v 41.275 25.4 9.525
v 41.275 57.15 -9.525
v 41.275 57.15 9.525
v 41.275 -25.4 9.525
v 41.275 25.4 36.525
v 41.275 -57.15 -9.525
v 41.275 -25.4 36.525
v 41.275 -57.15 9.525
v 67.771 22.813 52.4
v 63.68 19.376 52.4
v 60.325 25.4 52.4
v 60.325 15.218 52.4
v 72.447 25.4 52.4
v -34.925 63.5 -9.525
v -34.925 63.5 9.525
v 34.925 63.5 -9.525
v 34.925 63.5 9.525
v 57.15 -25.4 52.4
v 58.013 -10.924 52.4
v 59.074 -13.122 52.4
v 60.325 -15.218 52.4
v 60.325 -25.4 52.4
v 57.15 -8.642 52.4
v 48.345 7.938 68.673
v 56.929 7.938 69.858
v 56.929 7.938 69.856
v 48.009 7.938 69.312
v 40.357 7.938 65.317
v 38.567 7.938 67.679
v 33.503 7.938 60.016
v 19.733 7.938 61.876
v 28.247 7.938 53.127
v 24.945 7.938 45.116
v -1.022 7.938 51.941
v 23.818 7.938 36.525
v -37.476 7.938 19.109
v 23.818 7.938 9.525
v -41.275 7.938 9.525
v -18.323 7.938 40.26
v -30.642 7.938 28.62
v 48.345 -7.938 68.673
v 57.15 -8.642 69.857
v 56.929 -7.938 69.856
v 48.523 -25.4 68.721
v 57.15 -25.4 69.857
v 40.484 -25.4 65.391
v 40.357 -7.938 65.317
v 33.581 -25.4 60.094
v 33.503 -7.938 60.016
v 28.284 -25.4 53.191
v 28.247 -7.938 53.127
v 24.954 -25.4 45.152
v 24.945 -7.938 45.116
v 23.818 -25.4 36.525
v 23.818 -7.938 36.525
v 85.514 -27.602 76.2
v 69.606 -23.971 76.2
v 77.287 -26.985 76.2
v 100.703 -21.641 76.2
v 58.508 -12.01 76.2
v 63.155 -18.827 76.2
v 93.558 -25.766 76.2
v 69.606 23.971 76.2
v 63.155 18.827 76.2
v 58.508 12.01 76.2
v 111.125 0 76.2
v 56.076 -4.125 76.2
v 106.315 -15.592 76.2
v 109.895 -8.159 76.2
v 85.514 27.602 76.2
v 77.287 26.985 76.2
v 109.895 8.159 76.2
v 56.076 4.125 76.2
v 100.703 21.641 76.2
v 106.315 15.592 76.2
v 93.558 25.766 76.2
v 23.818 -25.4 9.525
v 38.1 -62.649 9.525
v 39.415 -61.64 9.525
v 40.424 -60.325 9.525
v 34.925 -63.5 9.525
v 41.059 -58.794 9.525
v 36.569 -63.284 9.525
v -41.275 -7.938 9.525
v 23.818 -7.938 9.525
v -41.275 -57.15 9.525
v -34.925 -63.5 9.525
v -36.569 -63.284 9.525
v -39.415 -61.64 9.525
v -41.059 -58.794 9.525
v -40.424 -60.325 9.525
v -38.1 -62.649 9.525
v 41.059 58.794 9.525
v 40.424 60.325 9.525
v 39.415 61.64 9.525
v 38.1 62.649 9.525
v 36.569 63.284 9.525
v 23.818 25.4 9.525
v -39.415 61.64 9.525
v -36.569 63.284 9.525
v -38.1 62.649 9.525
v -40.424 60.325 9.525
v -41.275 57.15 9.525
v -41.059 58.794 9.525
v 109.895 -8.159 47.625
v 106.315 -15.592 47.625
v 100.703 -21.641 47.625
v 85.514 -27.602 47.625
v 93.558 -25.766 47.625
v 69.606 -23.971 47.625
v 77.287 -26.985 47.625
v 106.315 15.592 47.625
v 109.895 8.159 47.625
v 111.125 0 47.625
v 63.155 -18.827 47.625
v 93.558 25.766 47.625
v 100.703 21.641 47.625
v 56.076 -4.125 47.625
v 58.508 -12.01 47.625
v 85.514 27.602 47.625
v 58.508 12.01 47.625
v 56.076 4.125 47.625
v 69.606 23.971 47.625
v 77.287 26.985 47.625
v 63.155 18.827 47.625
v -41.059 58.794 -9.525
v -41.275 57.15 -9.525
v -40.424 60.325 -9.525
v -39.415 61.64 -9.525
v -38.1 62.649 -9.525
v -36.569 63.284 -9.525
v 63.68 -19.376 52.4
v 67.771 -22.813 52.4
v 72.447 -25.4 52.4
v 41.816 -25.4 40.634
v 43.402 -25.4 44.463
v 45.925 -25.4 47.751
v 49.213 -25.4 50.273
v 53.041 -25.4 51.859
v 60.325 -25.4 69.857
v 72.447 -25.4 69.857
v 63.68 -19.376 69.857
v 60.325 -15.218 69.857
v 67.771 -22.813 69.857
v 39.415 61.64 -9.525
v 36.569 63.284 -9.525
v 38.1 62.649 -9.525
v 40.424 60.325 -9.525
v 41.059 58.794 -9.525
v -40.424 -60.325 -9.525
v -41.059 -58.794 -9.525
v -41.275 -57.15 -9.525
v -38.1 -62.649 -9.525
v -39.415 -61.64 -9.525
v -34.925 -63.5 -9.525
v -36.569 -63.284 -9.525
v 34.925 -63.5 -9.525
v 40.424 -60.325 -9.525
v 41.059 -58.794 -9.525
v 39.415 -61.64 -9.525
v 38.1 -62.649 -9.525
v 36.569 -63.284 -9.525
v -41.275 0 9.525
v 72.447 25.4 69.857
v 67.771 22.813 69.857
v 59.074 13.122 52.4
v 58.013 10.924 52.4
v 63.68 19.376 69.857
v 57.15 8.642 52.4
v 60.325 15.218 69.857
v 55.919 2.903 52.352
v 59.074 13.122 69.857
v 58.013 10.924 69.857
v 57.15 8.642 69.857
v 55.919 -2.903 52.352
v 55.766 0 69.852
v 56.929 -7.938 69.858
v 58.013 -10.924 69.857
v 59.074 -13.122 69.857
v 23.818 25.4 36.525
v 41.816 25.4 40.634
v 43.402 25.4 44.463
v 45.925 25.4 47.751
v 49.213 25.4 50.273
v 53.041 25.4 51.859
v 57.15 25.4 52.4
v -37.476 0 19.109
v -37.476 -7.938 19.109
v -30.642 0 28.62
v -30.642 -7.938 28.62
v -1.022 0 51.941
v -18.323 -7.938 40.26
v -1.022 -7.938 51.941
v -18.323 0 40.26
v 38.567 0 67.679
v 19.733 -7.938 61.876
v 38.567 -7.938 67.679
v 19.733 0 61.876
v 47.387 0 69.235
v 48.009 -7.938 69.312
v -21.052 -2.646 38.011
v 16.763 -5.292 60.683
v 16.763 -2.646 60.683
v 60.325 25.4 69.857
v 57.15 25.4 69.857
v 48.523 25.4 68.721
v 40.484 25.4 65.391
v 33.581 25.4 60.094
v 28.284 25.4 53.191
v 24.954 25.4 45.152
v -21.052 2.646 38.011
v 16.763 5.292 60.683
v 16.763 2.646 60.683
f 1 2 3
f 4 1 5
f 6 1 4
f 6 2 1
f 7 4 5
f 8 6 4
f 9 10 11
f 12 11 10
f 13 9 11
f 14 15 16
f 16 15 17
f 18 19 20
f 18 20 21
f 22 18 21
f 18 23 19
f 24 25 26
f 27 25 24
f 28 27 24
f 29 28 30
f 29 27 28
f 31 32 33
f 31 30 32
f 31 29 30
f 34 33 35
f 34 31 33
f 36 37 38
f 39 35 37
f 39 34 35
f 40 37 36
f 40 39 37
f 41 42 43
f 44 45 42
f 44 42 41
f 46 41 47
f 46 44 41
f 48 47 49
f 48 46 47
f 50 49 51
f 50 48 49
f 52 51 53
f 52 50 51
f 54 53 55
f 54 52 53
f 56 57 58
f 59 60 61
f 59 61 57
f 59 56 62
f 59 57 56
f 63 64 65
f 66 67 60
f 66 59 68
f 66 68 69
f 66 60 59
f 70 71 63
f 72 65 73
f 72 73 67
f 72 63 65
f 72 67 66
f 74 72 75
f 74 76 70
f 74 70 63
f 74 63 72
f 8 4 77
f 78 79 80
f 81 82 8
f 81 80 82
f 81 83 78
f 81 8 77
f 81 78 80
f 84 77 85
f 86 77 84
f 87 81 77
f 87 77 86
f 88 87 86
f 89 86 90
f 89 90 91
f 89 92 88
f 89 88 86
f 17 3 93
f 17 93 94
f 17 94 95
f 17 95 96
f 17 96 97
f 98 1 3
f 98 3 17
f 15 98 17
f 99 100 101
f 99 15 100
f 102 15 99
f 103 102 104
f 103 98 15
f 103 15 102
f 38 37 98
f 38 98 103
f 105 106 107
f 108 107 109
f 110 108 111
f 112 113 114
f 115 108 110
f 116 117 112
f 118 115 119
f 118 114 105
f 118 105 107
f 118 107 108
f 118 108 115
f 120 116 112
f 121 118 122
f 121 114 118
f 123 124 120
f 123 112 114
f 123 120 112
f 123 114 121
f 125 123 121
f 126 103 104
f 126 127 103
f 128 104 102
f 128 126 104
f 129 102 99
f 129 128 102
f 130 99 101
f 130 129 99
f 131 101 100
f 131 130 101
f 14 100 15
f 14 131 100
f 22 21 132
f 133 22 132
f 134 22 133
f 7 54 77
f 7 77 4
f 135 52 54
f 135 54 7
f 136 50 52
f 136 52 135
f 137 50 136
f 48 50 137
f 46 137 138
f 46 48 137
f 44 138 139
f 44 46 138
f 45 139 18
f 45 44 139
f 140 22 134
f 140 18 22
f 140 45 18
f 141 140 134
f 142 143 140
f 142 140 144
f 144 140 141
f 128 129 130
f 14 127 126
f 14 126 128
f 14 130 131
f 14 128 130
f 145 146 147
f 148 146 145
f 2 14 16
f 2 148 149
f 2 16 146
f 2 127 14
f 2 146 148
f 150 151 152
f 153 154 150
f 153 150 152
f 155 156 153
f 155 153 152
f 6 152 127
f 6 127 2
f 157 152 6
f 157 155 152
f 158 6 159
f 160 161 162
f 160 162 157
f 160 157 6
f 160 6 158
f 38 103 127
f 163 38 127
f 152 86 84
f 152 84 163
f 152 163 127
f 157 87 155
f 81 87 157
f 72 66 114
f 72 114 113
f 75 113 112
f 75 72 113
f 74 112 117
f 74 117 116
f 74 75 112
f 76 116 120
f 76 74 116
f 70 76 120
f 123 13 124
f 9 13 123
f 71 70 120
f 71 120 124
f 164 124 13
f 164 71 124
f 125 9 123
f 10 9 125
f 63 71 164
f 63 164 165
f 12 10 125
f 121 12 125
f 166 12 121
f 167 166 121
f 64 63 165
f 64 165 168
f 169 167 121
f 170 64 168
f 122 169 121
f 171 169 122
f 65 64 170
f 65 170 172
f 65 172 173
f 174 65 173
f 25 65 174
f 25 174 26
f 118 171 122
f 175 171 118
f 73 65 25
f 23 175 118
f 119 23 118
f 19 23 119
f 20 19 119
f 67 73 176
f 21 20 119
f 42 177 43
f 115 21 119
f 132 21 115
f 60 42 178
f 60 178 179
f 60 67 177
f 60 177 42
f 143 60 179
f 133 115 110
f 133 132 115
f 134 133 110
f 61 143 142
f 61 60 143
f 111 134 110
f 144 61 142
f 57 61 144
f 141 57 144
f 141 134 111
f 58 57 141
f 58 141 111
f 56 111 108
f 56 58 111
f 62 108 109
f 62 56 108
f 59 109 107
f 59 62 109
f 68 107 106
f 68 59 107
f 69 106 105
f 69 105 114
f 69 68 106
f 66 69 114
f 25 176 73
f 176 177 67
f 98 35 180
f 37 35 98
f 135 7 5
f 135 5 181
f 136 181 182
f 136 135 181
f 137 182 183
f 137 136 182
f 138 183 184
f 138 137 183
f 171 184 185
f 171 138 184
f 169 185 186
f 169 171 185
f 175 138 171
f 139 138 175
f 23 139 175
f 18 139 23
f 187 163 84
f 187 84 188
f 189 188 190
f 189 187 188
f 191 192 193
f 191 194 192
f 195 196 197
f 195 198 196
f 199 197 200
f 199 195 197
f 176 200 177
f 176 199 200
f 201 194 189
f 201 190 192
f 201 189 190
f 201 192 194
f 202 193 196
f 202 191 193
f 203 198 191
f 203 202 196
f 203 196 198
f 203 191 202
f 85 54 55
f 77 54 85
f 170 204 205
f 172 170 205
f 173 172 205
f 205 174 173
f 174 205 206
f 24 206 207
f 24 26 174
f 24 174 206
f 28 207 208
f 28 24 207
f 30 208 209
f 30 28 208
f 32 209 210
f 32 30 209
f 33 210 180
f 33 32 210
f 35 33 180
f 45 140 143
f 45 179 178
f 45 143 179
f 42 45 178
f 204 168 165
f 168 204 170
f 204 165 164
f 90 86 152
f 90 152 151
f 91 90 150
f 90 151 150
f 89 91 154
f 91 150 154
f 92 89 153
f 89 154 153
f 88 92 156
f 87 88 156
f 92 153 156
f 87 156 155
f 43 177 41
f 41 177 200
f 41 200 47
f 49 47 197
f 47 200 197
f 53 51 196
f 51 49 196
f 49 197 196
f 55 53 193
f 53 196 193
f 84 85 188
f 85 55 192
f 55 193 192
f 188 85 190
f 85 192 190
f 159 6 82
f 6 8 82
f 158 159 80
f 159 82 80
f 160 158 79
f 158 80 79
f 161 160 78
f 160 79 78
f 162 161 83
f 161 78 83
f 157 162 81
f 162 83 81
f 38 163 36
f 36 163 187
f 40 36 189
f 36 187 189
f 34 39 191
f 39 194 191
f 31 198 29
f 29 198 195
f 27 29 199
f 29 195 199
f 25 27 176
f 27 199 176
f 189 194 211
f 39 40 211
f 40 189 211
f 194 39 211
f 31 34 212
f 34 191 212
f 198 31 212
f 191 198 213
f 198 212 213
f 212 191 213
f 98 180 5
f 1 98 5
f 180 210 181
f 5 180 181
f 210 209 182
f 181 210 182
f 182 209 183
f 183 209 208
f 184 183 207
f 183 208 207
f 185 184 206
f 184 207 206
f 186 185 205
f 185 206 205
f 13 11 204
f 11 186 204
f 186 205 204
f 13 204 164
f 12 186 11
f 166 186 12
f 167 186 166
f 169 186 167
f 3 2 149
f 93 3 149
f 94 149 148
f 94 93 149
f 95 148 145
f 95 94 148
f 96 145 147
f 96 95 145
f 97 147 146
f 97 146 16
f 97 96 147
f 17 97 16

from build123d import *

# Parameters (mm, degrees)
F1_DEPTH = 63.5
F0_W     = 23.120732
F0_H     = 17.456719
F2_DEPTH = 25.4
F3_DEPTH = 7.9375
F5_R     = 6.35


with BuildPart() as f1:
    # F0 (on Front) → F1 (new body, symmetric)
    with BuildSketch(Plane.XZ):
        Polygon((23.818281, 9.525), (-41.275, 9.525), (-41.275, -9.525), (41.275, -9.525), (41.275, 9.525), align=None)
    extrude(amount=F1_DEPTH, both=True)

    # F0 (on Front) → F2 (join, symmetric)
    with BuildSketch(Plane.XZ):
        with Locations((71.885366, 61.128559)):
            Rectangle(F0_W, F0_H)
        with BuildLine():
            Line((23.818281, 36.5252), (23.818281, 9.525))
            Line((23.818281, 9.525), (41.275, 9.525))
            Line((41.275, 9.525), (41.275, 36.5252))
            ThreePointArc((41.275, 36.5252), (45.92468, 47.75052), (57.15, 52.4002))
            Line((57.15, 52.4002), (60.325, 52.4002))
            Line((60.325, 52.4002), (60.325, 69.856919))
            Line((60.325, 69.856919), (57.15, 69.856919))
            ThreePointArc((57.15, 69.856919), (33.580915, 60.094285), (23.818281, 36.5252))
        make_face()
    extrude(amount=F2_DEPTH, both=True)

    # F0 (on Front) → F3 (join, symmetric)
    with BuildSketch(Plane.XZ):
        with BuildLine():
            add(Edge.make_bspline(
                [(-41.275, 9.525), (-34.914378, 38.415078), (20.892713, 70.120394), (57.15, 69.856919)],
                knots=[0, 0, 0, 0, 115.44445, 115.44445, 115.44445, 115.44445], degree=3))
            Line((-41.275, 9.525), (23.818281, 9.525))
            Line((23.818281, 9.525), (23.818281, 36.5252))
            ThreePointArc((23.818281, 36.5252), (33.580915, 60.094285), (57.15, 69.856919))
        make_face()
    extrude(amount=F3_DEPTH, both=True)

    # F0 (on Front) → F4 (revolve)
    with BuildSketch(Plane.XZ):
        Polygon((83.445732, 76.2), (83.445732, 69.856919), (83.445732, 52.4002), (83.445732, 47.625), (111.125, 47.625), (111.125, 76.2), align=None)
    revolve(axis=Axis((83.445732, 0, 61.9125), (0, 0, 1)))

    # F5
    f5_edges = [f1.edges().sort_by_distance(p)[0] for p in [
        (-41.275, -63.5, 0),
        (41.275, -63.5, 0),
        (41.275, 63.5, 0),
        (-41.275, 63.5, 0),
    ]]
    fillet(f5_edges, radius=F5_R)


solid = f1.part
